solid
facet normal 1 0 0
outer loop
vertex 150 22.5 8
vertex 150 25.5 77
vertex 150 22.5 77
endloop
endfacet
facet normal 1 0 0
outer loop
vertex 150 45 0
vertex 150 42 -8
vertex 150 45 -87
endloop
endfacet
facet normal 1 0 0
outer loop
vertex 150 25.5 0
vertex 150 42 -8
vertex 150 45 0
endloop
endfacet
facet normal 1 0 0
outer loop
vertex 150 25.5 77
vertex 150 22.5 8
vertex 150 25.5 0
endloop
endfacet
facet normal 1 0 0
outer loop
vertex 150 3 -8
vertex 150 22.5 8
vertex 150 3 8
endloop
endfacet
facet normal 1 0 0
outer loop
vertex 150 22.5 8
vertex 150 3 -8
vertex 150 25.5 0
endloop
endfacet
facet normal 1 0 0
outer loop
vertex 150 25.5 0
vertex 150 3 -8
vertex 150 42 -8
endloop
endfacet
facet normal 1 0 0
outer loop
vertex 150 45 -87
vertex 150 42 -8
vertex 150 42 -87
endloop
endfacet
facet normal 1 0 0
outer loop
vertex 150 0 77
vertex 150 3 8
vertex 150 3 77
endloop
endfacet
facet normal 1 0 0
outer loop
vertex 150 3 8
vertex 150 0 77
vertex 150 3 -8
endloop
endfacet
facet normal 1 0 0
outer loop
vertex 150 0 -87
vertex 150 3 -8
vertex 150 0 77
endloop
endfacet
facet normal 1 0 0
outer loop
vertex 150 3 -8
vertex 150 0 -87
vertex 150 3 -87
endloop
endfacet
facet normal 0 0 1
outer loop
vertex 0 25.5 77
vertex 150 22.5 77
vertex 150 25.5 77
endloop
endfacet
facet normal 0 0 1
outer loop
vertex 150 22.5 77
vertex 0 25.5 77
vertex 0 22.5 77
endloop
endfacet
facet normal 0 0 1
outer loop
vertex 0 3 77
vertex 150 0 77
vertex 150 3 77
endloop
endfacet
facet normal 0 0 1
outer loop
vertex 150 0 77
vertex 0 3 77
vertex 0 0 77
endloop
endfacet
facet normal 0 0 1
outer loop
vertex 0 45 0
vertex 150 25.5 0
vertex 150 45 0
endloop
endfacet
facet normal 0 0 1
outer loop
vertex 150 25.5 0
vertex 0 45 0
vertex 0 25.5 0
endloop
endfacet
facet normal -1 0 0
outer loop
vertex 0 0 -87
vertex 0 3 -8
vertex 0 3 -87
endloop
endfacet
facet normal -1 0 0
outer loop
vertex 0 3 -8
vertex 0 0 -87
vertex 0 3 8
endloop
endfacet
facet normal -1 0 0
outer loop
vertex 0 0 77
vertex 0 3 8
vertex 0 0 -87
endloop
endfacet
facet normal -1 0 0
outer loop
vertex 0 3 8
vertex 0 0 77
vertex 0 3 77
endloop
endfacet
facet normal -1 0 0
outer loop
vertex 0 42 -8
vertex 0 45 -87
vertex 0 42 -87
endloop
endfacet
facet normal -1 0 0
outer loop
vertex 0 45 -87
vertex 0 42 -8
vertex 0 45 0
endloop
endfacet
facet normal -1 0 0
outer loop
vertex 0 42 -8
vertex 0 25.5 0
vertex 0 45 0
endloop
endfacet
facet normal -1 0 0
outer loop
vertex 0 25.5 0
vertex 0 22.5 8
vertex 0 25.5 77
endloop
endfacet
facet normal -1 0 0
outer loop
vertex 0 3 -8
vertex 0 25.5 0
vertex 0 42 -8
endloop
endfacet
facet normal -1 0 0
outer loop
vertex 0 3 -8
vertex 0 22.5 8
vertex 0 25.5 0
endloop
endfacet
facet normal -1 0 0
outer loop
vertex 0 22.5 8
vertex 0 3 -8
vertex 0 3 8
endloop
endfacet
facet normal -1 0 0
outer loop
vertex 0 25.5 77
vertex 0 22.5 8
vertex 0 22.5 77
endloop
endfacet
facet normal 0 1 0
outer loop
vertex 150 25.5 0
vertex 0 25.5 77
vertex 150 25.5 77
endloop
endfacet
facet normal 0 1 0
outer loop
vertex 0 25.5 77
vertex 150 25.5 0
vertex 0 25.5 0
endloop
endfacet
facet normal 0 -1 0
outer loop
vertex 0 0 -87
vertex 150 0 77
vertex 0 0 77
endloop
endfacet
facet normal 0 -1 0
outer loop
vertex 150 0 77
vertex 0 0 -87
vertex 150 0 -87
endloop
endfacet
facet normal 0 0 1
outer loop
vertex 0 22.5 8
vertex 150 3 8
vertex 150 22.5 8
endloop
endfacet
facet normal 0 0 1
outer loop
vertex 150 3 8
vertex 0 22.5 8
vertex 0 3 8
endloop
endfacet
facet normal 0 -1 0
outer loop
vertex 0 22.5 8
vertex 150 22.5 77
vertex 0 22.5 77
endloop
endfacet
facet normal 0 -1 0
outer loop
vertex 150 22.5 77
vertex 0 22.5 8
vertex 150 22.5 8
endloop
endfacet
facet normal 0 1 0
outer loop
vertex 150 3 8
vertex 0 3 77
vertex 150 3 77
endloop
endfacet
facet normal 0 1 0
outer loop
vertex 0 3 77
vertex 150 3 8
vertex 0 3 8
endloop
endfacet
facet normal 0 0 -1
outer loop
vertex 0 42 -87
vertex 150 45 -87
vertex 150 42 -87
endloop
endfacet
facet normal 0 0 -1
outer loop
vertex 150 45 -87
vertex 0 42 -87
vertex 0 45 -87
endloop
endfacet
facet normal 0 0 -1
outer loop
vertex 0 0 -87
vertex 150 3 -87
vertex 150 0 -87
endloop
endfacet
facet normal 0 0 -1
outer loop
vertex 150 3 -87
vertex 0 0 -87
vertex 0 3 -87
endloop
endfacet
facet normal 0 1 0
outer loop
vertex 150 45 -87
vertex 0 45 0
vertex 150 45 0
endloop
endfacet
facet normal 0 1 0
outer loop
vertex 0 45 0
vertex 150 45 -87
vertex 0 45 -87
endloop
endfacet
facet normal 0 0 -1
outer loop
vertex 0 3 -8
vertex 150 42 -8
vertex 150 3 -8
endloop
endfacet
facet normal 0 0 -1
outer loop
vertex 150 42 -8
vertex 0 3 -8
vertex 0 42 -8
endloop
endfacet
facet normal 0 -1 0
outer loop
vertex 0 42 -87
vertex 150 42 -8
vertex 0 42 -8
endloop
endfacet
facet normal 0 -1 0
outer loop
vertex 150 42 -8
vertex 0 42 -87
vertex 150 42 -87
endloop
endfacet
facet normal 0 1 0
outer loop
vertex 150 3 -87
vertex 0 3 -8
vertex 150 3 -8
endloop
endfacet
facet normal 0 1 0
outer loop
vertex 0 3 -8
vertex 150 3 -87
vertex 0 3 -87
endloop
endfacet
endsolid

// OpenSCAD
clip_width = 150;
clip_length = 25.5;
clip_height = 77;
clip_wall = 3;
clip_z_offset = 8;
clip_color = "purple";

name_text = "Juliet";
name_font = "Sawasdee Regular";
name_size = 36;
name_thickness = 2;
name_color = "red";

holder_width = 150;
holder_length = 45;
holder_height = 87;
holder_wall = 3;
holder_z_offset = 8;
holder_color = "purple";

module Clip() {
    color(clip_color)
    difference() {
        cube([clip_width, clip_length, clip_height]);
        translate([0, clip_wall, clip_z_offset]) {
            cube([clip_width, clip_length-(clip_wall*2), clip_height]);
        }
    }
}

module Name(thickness) {
    color(name_color)
    translate([(holder_width / 2), (holder_length - name_thickness), -(holder_height / 2)]) {
        rotate([90, 180, 180]){
            linear_extrude(height=thickness) {
                text(name_text, font=name_font, size=name_size, halign="center", valign="center");
            }
        }
    }
}

module Holder() {
    color(holder_color)
    translate([0, 0, -(holder_height)]) {
        difference() {
            cube([holder_width, holder_length, holder_height]);
            translate([0, holder_wall, -holder_z_offset]) {
                cube([holder_width, holder_length-(holder_wall*2), holder_height]);
            }
   
        }
    }
}

module HolderSansName() {
    difference() {
        Holder();
        Name(thickness=(name_thickness + 1));
    }
}

Clip();
HolderSansName();
Name(name_thickness);
